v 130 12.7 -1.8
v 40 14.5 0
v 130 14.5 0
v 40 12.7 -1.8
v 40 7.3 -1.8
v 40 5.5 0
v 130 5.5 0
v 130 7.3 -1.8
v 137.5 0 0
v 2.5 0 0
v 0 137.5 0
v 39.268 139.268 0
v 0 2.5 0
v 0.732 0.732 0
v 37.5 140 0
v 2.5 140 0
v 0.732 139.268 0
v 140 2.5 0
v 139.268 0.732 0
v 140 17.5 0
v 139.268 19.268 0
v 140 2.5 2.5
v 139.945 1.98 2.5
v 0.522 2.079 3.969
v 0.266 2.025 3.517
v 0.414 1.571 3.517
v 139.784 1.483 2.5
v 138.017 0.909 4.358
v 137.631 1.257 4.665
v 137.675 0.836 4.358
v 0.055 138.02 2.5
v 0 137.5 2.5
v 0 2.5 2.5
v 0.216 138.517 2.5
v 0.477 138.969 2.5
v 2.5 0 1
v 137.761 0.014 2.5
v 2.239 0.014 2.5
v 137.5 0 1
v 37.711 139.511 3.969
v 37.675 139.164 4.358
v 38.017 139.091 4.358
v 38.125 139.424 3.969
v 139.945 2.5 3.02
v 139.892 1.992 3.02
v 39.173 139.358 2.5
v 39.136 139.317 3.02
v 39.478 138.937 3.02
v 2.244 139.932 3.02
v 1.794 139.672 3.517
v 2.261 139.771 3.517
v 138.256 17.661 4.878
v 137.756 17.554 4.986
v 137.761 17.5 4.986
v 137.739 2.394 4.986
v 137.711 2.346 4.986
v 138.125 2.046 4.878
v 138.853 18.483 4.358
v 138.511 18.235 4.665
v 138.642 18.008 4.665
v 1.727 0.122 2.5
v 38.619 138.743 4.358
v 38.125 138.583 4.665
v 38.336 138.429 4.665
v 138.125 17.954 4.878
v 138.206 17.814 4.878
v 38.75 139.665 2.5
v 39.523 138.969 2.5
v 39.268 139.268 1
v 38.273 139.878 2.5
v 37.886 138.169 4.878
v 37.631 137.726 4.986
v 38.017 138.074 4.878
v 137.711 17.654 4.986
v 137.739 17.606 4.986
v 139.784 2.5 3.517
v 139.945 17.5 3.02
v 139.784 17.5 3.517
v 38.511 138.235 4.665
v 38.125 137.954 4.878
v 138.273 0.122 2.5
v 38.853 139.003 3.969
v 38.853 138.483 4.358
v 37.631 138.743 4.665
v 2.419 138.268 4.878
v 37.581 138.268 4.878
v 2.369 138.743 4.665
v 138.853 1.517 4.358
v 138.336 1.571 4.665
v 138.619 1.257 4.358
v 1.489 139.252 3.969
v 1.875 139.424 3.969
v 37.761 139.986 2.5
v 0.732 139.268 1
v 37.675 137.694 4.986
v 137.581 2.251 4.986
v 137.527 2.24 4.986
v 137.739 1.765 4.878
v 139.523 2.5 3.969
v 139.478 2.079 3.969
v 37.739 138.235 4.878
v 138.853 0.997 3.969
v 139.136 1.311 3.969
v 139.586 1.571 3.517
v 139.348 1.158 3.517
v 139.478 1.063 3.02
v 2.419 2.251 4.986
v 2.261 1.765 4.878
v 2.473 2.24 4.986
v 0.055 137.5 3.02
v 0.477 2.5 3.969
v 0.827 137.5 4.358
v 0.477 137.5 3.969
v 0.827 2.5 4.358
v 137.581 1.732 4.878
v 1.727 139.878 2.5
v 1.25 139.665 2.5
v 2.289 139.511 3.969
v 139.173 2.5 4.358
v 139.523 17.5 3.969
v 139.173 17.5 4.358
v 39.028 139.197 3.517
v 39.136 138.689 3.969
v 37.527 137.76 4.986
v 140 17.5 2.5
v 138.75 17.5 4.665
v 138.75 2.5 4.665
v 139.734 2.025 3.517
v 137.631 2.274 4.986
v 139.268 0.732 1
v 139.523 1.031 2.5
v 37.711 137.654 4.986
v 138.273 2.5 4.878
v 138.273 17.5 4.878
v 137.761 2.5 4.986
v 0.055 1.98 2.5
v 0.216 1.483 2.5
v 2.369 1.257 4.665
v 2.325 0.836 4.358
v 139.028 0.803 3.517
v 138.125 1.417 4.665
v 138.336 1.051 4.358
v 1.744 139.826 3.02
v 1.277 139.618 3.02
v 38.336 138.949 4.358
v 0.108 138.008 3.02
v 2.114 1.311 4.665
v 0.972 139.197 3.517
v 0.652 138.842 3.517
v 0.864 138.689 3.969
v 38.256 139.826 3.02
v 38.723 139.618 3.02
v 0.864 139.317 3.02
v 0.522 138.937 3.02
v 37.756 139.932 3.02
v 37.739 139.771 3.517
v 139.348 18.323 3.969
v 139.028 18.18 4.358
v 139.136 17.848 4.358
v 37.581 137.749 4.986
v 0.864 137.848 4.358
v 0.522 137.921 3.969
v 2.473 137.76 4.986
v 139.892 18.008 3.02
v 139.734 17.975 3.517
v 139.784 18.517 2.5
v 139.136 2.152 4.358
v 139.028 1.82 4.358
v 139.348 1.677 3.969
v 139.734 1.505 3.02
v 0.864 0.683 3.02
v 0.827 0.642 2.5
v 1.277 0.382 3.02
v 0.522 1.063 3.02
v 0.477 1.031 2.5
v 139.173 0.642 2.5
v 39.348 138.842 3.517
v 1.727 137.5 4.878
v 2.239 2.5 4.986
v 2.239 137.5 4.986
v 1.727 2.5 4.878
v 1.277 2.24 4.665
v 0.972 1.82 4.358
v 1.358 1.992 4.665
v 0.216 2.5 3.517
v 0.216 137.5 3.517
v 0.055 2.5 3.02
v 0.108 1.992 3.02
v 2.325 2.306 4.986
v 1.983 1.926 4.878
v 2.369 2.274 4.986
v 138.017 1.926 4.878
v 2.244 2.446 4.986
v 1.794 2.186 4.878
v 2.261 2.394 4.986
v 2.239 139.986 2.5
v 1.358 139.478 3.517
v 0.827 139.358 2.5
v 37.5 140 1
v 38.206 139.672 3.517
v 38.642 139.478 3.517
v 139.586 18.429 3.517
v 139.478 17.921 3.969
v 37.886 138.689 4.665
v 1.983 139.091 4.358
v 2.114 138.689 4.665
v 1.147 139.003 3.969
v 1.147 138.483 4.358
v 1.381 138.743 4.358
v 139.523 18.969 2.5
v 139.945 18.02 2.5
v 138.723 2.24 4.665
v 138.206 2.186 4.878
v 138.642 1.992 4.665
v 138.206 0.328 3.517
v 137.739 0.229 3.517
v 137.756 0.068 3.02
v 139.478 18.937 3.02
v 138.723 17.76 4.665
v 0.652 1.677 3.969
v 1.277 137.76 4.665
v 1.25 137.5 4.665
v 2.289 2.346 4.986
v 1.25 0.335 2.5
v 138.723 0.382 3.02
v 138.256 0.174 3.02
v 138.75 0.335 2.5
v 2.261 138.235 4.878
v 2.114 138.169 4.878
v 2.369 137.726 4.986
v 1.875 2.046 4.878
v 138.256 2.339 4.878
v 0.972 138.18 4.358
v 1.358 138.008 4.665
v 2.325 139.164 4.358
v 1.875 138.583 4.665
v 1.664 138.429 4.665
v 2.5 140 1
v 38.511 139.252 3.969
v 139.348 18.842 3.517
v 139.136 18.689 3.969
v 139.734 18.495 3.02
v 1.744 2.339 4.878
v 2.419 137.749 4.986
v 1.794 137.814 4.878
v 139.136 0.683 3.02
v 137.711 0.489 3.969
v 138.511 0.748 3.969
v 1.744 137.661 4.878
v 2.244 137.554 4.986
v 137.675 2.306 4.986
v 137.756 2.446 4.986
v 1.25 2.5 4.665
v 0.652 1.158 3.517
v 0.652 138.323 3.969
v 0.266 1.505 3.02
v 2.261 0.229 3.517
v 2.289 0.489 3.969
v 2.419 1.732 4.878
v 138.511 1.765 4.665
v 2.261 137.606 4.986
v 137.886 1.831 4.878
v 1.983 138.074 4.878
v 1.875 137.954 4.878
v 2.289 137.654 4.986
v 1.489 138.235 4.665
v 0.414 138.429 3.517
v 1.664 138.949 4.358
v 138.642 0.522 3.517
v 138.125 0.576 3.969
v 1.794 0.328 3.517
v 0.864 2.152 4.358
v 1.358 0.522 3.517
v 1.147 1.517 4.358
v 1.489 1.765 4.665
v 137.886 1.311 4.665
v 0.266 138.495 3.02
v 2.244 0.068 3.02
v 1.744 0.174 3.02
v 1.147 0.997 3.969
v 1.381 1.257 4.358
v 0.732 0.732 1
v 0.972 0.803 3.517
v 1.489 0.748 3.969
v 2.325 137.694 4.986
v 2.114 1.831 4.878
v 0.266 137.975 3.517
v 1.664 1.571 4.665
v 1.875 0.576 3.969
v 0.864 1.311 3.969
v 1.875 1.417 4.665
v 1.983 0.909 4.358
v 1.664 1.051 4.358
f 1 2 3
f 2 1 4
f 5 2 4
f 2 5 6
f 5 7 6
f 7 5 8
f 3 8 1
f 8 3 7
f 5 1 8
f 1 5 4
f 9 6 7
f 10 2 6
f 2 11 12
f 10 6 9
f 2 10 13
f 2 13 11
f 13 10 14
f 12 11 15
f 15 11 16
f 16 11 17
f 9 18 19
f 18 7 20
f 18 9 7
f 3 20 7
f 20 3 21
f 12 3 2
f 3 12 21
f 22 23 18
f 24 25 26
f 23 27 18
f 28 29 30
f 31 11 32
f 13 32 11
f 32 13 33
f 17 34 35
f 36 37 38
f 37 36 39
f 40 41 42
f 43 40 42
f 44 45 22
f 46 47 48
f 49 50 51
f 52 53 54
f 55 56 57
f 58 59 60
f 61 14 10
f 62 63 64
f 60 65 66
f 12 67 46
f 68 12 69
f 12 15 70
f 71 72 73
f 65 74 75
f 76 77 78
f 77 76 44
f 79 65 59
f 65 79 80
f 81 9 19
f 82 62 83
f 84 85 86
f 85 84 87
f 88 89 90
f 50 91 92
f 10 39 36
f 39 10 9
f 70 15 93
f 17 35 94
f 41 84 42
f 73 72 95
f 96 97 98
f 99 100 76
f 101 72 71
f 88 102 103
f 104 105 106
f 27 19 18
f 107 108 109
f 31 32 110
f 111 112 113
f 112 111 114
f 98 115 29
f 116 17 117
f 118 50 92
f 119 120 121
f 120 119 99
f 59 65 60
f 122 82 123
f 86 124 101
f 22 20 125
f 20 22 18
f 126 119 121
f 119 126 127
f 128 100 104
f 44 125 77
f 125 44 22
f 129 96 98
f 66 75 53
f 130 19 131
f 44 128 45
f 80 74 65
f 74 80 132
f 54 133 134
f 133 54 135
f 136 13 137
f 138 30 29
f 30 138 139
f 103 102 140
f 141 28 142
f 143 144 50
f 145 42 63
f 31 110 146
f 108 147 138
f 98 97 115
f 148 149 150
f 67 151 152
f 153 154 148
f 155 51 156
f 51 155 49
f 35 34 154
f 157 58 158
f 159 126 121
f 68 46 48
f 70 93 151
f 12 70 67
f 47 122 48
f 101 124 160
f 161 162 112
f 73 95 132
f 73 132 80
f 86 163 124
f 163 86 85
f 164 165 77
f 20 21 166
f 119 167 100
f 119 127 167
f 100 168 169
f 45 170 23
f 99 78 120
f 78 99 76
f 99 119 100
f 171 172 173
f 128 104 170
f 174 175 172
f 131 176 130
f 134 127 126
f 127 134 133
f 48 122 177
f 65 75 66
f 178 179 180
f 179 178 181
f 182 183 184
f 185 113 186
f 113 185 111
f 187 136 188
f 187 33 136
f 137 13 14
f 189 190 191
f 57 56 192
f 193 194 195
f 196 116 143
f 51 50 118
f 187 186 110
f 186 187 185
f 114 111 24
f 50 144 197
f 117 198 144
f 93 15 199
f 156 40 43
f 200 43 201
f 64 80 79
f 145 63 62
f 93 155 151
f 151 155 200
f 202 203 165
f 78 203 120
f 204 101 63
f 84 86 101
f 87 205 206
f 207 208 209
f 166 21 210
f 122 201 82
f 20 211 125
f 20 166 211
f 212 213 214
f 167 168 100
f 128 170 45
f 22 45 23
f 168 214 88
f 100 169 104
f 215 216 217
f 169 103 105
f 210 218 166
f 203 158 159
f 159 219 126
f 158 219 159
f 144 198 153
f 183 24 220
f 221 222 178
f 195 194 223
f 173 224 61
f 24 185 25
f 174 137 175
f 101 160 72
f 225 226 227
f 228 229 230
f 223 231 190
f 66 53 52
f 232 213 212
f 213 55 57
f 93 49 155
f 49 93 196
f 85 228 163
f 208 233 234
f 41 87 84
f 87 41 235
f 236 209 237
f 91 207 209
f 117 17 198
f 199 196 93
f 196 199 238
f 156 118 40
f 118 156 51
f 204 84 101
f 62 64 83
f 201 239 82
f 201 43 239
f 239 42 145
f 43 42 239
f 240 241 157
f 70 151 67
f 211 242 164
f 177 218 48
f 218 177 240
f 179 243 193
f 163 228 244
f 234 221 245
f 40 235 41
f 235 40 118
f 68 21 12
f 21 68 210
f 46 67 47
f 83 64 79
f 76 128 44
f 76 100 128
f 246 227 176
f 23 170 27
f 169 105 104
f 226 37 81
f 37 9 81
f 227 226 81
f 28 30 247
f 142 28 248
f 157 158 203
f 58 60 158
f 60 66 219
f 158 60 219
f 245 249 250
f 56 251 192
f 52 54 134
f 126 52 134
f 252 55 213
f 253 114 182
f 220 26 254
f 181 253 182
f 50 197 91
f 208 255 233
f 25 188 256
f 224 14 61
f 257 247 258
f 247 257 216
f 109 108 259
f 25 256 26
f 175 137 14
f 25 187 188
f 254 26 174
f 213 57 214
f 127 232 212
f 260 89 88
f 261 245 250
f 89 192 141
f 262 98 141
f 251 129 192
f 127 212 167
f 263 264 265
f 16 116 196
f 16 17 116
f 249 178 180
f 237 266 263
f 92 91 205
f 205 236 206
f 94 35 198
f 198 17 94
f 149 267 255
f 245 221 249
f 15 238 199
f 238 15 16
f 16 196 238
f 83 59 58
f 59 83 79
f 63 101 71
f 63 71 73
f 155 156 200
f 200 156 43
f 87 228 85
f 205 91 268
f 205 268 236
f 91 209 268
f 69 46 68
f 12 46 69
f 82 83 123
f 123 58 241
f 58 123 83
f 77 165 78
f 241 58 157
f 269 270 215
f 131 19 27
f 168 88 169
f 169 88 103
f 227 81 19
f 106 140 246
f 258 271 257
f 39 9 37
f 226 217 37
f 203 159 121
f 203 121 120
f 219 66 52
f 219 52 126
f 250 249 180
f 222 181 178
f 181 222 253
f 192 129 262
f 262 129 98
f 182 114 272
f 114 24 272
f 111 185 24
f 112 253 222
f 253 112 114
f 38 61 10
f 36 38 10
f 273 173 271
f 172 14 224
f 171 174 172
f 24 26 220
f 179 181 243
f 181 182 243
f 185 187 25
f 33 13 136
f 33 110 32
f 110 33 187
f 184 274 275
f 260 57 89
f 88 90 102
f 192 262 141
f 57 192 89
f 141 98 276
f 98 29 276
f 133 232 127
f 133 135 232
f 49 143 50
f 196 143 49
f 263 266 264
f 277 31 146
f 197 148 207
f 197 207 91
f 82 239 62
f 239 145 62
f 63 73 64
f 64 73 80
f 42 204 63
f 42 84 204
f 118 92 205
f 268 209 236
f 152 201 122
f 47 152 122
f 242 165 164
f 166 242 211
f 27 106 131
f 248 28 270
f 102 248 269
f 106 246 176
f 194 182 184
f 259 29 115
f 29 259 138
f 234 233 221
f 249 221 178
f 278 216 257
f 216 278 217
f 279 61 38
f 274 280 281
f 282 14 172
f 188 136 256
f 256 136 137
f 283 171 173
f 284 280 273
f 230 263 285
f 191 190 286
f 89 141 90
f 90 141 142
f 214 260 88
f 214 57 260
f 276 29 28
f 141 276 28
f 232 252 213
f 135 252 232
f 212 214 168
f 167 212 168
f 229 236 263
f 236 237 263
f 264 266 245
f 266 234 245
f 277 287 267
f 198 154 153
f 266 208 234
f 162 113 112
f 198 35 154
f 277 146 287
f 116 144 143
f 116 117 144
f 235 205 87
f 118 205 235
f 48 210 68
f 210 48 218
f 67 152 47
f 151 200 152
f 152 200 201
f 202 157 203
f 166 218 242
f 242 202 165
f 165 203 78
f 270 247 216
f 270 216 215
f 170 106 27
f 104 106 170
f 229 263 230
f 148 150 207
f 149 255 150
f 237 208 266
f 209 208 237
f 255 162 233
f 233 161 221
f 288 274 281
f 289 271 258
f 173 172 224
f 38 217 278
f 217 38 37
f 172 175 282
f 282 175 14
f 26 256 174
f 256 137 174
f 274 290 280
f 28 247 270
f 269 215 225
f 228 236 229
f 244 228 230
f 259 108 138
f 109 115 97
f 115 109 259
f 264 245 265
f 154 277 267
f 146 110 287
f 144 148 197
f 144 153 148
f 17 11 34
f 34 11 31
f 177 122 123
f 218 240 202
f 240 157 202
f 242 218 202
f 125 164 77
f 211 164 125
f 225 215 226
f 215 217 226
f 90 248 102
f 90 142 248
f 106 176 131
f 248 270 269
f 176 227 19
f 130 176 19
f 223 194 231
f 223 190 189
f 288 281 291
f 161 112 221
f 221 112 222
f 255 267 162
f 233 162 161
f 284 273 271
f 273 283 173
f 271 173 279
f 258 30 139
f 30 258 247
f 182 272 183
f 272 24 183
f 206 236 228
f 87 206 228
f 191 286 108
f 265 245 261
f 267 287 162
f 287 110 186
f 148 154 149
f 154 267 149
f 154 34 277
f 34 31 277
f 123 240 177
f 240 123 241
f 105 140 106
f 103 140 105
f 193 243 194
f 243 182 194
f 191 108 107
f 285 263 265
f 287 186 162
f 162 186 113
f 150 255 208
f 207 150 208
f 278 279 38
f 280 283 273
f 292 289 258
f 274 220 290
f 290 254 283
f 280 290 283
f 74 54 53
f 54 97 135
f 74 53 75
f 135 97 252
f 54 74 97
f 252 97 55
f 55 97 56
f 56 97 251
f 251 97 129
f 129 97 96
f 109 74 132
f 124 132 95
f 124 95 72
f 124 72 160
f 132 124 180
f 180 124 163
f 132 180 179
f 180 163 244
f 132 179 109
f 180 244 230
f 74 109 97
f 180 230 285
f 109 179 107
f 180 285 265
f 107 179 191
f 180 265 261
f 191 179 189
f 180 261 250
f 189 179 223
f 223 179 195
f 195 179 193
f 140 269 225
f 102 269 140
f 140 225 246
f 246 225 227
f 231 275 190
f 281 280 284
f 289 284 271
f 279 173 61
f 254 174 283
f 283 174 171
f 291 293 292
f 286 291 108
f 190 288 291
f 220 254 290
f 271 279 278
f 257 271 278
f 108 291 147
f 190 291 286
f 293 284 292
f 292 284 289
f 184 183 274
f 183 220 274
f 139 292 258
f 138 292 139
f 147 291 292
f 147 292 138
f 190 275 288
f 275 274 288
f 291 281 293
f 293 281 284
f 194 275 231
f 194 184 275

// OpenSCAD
include <MCAD/shapes.scad>
//color([1,1,1]) %cube([140,140,5]);

module slot_fill(length = 20) {
	difference() {
		translate([0, 0, 0]) rotate([0, 0, 0])
		 cylinder(r=4.5, h=length, center=true,  $fn=4);	

//plane sides
		translate([-3.8, 0, 0]) rotate([0, 0, 0])
		 cube([4, 20, length*2], center=true);
		translate([3, 0, 0]) rotate([0, 0, 0])
		 cube([6, 20, length*2], center=true);
	}
}

module corner(height=1,width=1){
  offset=2.5;
  thickness=2.5;
  size=140;
  hull(){
    translate([10*width,size/2,0.5]) roundedBox(20*width,size,1, 2.5);
    translate([size/2,10*height,0.5]) roundedBox(size,20*height,1, 2.5);
    translate([offset,offset,thickness]) sphere(d=5, $fn=30);
    translate([offset,size-offset,thickness]) sphere(d=5, $fn=30);
    translate([(width*20)-offset,size-offset,thickness]) sphere(d=5, $fn=30);

    translate([size-offset,offset,thickness]) sphere(d=5, $fn=30);
    translate([size-offset,(height*20)-offset,thickness]) sphere(d=5, $fn=30);
  }
  translate([45+(20*width),10,0]) rotate([0,-90,0]) slot_fill(length=size-10-(20*width));
}

corner(height=1,width=2);



//roundedBox(20, 140, 1, 2.5, center=true);
